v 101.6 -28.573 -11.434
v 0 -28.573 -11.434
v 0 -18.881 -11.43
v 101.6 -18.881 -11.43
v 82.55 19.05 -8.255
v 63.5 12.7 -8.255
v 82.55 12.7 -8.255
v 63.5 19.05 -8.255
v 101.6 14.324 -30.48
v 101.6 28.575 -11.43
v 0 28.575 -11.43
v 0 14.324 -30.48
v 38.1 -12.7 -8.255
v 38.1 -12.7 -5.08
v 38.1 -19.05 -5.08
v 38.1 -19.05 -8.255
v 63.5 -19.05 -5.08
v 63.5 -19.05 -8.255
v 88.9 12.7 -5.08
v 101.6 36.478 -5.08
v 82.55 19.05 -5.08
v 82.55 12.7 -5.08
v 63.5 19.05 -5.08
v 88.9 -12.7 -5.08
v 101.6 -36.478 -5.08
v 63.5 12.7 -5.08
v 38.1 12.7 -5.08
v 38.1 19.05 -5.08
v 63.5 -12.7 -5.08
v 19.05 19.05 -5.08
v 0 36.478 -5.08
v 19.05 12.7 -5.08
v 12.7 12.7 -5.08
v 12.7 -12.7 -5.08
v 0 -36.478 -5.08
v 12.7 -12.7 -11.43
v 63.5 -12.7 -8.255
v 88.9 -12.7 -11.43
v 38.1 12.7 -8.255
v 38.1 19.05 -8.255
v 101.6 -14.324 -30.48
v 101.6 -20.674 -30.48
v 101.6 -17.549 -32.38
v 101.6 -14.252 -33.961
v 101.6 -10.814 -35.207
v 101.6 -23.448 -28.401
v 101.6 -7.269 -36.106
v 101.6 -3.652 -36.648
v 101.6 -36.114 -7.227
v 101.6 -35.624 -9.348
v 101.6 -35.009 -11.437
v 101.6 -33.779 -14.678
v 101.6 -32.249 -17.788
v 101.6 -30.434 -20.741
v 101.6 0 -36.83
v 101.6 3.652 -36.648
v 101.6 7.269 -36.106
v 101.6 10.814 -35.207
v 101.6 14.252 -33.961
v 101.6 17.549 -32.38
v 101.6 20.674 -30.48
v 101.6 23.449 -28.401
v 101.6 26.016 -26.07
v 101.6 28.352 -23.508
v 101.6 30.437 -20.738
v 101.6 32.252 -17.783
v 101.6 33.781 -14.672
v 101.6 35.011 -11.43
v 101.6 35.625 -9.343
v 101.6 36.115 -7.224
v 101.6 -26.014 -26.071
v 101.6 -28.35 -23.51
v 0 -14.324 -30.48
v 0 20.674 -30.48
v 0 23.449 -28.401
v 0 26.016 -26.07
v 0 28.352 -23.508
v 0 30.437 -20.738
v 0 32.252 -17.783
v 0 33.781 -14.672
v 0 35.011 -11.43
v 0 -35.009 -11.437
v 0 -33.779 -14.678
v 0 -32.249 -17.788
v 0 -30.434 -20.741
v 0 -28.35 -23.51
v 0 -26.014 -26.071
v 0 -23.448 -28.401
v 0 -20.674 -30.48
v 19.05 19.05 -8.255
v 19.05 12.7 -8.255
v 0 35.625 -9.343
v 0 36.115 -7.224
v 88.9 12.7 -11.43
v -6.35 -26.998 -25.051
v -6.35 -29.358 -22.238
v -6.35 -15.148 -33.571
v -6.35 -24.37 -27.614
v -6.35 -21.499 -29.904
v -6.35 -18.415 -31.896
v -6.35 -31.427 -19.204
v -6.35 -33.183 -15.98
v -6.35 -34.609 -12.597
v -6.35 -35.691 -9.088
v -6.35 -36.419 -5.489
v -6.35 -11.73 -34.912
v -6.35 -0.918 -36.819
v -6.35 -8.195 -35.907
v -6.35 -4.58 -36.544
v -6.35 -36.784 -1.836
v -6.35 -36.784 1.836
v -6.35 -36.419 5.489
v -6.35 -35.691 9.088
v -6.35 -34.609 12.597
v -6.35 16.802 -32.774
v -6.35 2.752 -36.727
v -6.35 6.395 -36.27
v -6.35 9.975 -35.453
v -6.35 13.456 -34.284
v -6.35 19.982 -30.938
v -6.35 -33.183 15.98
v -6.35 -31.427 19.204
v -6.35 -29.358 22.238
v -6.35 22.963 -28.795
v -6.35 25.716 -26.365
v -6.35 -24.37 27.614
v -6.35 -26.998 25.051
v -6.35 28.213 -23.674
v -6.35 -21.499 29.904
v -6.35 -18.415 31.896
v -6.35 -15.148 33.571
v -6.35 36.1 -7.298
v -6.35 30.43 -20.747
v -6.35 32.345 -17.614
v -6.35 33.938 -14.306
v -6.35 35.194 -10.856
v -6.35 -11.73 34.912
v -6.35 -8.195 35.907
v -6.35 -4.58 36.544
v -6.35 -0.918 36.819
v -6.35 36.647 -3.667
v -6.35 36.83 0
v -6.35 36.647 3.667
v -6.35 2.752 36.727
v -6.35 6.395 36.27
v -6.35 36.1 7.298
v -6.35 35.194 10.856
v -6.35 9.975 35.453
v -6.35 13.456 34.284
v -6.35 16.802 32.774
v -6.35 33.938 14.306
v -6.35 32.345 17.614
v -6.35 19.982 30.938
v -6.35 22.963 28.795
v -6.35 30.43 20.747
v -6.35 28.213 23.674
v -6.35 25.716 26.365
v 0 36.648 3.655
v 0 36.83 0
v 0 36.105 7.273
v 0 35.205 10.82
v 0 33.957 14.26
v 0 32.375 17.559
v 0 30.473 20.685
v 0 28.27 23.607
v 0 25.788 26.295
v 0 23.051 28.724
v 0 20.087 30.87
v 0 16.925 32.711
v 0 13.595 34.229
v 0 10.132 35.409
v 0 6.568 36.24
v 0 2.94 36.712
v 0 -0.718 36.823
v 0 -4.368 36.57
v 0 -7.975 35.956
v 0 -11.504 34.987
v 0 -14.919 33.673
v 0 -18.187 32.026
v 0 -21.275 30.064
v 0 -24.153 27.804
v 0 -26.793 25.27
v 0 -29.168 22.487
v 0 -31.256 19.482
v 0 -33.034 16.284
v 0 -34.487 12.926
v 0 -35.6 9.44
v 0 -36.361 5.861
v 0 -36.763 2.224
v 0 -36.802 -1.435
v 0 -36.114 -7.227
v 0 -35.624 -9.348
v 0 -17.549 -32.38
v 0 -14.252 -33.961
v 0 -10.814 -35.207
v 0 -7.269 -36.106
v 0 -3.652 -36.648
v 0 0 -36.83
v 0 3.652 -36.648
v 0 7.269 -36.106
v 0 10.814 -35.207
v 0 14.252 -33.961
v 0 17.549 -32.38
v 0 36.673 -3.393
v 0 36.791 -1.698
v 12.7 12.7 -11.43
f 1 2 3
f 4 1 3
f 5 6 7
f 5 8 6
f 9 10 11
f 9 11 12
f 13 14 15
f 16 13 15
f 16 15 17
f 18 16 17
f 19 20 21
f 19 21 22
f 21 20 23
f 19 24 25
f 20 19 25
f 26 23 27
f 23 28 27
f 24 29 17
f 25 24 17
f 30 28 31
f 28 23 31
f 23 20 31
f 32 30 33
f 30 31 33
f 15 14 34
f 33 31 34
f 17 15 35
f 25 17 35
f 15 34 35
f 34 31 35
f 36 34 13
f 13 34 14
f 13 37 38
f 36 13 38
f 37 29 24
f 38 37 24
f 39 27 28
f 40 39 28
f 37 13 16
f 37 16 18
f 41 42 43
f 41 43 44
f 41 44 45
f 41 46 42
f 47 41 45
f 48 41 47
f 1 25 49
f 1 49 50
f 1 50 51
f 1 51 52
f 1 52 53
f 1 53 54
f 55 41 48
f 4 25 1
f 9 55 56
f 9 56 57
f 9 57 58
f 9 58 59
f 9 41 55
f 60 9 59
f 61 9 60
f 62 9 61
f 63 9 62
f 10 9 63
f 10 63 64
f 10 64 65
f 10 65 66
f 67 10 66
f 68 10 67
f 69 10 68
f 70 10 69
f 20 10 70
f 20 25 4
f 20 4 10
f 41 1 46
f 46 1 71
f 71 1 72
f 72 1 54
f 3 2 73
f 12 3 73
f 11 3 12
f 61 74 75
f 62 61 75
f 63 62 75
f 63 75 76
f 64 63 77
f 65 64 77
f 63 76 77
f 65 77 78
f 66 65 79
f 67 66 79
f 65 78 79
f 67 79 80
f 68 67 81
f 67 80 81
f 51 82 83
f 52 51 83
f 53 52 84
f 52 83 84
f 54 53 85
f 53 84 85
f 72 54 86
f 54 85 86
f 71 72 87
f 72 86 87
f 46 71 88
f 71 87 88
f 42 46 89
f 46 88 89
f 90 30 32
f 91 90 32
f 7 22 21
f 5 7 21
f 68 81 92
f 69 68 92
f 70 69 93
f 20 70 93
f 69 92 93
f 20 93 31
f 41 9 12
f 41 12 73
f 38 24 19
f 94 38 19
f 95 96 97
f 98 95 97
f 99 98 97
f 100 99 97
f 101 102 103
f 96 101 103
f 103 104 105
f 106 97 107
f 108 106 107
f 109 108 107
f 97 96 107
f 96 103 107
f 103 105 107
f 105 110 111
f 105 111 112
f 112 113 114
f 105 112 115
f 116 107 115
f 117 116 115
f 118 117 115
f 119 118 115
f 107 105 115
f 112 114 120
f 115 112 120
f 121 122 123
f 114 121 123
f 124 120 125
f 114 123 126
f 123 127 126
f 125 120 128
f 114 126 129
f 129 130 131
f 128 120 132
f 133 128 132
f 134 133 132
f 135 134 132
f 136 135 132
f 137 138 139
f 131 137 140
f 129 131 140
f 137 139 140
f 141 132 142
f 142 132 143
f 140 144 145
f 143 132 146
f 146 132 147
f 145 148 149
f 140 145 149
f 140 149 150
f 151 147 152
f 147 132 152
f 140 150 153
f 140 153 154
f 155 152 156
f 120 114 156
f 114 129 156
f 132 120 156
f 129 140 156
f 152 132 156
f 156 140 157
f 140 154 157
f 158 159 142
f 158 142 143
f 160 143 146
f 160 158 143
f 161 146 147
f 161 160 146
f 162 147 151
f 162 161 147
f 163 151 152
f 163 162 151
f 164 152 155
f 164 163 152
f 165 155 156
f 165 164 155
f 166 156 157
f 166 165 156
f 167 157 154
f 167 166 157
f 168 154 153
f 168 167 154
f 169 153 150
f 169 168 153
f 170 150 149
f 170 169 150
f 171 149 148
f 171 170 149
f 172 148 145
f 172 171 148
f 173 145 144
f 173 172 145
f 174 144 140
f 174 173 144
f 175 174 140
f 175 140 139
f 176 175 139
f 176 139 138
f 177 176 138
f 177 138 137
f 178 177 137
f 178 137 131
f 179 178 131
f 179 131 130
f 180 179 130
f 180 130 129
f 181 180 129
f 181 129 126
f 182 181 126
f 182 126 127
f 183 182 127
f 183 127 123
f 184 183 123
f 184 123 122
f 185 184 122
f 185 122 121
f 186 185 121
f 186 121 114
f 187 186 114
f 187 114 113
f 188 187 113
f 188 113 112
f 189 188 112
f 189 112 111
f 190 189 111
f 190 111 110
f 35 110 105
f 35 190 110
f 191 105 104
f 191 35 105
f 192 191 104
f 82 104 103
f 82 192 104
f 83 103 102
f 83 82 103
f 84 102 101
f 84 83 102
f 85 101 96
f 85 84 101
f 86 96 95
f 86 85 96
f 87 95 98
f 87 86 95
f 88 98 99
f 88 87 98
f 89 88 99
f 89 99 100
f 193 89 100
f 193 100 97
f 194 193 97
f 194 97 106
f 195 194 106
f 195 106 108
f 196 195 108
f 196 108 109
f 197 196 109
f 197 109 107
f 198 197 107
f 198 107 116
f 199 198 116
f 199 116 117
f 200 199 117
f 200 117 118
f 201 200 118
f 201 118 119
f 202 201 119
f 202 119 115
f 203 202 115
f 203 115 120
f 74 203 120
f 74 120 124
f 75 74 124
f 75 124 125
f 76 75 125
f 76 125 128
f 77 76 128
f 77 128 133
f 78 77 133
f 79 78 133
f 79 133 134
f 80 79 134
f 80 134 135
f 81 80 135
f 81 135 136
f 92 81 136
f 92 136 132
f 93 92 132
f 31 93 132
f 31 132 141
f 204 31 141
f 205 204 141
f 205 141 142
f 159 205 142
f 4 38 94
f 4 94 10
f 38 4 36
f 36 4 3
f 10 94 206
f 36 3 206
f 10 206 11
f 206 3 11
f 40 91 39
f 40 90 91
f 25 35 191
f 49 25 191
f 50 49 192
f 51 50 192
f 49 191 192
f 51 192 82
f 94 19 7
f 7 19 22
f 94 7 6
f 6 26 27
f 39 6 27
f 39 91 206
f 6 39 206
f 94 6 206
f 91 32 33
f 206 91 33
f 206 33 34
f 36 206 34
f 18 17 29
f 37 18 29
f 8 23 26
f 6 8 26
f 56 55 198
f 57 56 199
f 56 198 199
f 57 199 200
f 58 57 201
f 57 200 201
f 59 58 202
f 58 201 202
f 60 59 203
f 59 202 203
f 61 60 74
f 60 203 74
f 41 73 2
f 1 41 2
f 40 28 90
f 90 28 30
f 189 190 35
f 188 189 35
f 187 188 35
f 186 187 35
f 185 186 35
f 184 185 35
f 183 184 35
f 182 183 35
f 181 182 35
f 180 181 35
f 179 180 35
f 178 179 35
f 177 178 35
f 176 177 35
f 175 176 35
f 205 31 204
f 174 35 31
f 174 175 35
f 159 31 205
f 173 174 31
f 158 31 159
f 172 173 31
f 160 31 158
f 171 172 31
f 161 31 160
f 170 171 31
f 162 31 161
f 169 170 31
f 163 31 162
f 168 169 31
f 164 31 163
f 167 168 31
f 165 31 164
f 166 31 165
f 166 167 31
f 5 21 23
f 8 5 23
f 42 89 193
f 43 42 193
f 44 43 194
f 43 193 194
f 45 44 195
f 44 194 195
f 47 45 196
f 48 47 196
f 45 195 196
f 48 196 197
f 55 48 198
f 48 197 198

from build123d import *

# Parameters (mm, degrees)
F2_DEPTH = 101.6
F0_R     = 36.83
F3_DEPTH = 6.35
F5_DEPTH = 6.35
F6_DEPTH = 3.175


# Not quite as in the source:
# - a feature names something its author has since deleted; it is built from what else it names


with BuildPart() as f2:
    # F1 (on face) → F2 (new body)
    with BuildSketch(Plane.YZ):
        Polygon((-28.5745194683, -8.2572300072), (-28.5730573626, -11.4344600145), (-18.8812190642, -11.43), (-6.2808282673, -11.43), (-6.2808282673, -8.2563601018), align=None)
        Polygon((0, -8.2561150224), (0, -11.43), (12.7450705782, -11.43), (28.5754804883, -11.43), (28.5754804883, -8.255), align=None)
        with BuildLine():
            Line((-14.324102157, -30.48), (-20.674102157, -30.48))
            ThreePointArc((-20.674102157, -30.48), (-10.8136603424, -35.2067273401), (0, -36.83))
            Line((0, -36.83), (0, -30.48))
            Line((0, -30.48), (-14.324102157, -30.48))
        make_face()
        with BuildLine():
            Line((0, -30.48), (0, -36.83))
            ThreePointArc((0, -36.83), (10.8136603424, -35.2067273401), (20.674102157, -30.48))
            Line((20.674102157, -30.48), (14.324102157, -30.48))
            Line((14.324102157, -30.48), (0, -30.48))
        make_face()
        Polygon((-6.2808282673, -11.43), (0, -11.43), (0, -8.2561150224), (-6.2808282673, -8.2563601018), align=None)
        Polygon((-6.2808282673, -8.2563601018), (0, -8.2561150224), (0, -5.08), (-6.2808282673, -5.08), align=None)
        with BuildLine():
            ThreePointArc((-36.4779728055, -5.08), (-35.8845812082, -8.2913045723), (-35.0090600232, -11.4374217503))
            Line((-35.0090600232, -11.4374217503), (-28.5730573626, -11.4344600145))
            Line((-28.5730573626, -11.4344600145), (-28.5745194683, -8.2572300072))
            Line((-28.5745194683, -8.2572300072), (-28.5759815739, -5.08))
            Line((-28.5759815739, -5.08), (-36.4779728055, -5.08))
        make_face()
        Polygon((-28.5759815739, -5.08), (-28.5745194683, -8.2572300072), (-6.2808282673, -8.2563601018), (-6.2808282673, -5.08), align=None)
        Polygon((0, -5.08), (0, -8.2561150224), (28.5754804883, -8.255), (28.5754804883, -5.08), align=None)
        with BuildLine():
            Line((28.5754804883, -11.43), (35.0114838303, -11.43))
            ThreePointArc((35.0114838303, -11.43), (35.8854598343, -8.2875009791), (36.4779728055, -5.08))
            Line((36.4779728055, -5.08), (28.5754804883, -5.08))
            Line((28.5754804883, -5.08), (28.5754804883, -8.255))
            Line((28.5754804883, -8.255), (28.5754804883, -11.43))
        make_face()
        with BuildLine():
            Line((14.324102157, -30.48), (20.674102157, -30.48))
            ThreePointArc((20.674102157, -30.48), (29.4269731146, -22.1472832038), (35.0114838303, -11.43))
            Line((35.0114838303, -11.43), (28.5754804883, -11.43))
            Line((28.5754804883, -11.43), (14.324102157, -30.48))
        make_face()
        with BuildLine():
            ThreePointArc((-35.0090600232, -11.4374217503), (-29.4246254725, -22.150402159), (-20.674102157, -30.48))
            Line((-20.674102157, -30.48), (-14.324102157, -30.48))
            Line((-14.324102157, -30.48), (-28.5730573626, -11.4344600145))
            Line((-28.5730573626, -11.4344600145), (-35.0090600232, -11.4374217503))
        make_face()
    extrude(amount=F2_DEPTH)

    # F0 (on Right) → F3 (join)
    with BuildSketch(Plane.YZ):
        Circle(F0_R)
    extrude(amount=-F3_DEPTH)

    # F4 (on face) → F5 (cut)
    with BuildSketch(Plane.XY.offset(-5.08)):
        Polygon((19.05, 12.7), (12.7, 12.7), (12.7, 0), (12.7, -12.7), (38.1, -12.7), (50.8, -12.7), (63.5, -12.7), (88.9, -12.7), (88.9, 0), (88.9, 12.7), (82.55, 12.7), (63.5, 12.7), (50.8, 12.7), (38.1, 12.7), align=None)
    extrude(amount=-F5_DEPTH, mode=Mode.SUBTRACT)

    # F4 (on face) → F6 (cut)
    with BuildSketch(Plane.XY.offset(-5.08)):
        Polygon((19.05, 15.875), (19.05, 12.7), (38.1, 12.7), (38.1, 15.875), (38.1, 19.05), (19.05, 19.05), align=None)
        Polygon((50.8, -12.7), (38.1, -12.7), (38.1, -15.875), (38.1, -19.05), (63.5, -19.05), (63.5, -15.875), (63.5, -12.7), align=None)
        Polygon((63.5, 15.875), (63.5, 12.7), (82.55, 12.7), (82.55, 15.875), (82.55, 19.05), (63.5, 19.05), align=None)
    extrude(amount=-F6_DEPTH, mode=Mode.SUBTRACT)


solid = f2.part
